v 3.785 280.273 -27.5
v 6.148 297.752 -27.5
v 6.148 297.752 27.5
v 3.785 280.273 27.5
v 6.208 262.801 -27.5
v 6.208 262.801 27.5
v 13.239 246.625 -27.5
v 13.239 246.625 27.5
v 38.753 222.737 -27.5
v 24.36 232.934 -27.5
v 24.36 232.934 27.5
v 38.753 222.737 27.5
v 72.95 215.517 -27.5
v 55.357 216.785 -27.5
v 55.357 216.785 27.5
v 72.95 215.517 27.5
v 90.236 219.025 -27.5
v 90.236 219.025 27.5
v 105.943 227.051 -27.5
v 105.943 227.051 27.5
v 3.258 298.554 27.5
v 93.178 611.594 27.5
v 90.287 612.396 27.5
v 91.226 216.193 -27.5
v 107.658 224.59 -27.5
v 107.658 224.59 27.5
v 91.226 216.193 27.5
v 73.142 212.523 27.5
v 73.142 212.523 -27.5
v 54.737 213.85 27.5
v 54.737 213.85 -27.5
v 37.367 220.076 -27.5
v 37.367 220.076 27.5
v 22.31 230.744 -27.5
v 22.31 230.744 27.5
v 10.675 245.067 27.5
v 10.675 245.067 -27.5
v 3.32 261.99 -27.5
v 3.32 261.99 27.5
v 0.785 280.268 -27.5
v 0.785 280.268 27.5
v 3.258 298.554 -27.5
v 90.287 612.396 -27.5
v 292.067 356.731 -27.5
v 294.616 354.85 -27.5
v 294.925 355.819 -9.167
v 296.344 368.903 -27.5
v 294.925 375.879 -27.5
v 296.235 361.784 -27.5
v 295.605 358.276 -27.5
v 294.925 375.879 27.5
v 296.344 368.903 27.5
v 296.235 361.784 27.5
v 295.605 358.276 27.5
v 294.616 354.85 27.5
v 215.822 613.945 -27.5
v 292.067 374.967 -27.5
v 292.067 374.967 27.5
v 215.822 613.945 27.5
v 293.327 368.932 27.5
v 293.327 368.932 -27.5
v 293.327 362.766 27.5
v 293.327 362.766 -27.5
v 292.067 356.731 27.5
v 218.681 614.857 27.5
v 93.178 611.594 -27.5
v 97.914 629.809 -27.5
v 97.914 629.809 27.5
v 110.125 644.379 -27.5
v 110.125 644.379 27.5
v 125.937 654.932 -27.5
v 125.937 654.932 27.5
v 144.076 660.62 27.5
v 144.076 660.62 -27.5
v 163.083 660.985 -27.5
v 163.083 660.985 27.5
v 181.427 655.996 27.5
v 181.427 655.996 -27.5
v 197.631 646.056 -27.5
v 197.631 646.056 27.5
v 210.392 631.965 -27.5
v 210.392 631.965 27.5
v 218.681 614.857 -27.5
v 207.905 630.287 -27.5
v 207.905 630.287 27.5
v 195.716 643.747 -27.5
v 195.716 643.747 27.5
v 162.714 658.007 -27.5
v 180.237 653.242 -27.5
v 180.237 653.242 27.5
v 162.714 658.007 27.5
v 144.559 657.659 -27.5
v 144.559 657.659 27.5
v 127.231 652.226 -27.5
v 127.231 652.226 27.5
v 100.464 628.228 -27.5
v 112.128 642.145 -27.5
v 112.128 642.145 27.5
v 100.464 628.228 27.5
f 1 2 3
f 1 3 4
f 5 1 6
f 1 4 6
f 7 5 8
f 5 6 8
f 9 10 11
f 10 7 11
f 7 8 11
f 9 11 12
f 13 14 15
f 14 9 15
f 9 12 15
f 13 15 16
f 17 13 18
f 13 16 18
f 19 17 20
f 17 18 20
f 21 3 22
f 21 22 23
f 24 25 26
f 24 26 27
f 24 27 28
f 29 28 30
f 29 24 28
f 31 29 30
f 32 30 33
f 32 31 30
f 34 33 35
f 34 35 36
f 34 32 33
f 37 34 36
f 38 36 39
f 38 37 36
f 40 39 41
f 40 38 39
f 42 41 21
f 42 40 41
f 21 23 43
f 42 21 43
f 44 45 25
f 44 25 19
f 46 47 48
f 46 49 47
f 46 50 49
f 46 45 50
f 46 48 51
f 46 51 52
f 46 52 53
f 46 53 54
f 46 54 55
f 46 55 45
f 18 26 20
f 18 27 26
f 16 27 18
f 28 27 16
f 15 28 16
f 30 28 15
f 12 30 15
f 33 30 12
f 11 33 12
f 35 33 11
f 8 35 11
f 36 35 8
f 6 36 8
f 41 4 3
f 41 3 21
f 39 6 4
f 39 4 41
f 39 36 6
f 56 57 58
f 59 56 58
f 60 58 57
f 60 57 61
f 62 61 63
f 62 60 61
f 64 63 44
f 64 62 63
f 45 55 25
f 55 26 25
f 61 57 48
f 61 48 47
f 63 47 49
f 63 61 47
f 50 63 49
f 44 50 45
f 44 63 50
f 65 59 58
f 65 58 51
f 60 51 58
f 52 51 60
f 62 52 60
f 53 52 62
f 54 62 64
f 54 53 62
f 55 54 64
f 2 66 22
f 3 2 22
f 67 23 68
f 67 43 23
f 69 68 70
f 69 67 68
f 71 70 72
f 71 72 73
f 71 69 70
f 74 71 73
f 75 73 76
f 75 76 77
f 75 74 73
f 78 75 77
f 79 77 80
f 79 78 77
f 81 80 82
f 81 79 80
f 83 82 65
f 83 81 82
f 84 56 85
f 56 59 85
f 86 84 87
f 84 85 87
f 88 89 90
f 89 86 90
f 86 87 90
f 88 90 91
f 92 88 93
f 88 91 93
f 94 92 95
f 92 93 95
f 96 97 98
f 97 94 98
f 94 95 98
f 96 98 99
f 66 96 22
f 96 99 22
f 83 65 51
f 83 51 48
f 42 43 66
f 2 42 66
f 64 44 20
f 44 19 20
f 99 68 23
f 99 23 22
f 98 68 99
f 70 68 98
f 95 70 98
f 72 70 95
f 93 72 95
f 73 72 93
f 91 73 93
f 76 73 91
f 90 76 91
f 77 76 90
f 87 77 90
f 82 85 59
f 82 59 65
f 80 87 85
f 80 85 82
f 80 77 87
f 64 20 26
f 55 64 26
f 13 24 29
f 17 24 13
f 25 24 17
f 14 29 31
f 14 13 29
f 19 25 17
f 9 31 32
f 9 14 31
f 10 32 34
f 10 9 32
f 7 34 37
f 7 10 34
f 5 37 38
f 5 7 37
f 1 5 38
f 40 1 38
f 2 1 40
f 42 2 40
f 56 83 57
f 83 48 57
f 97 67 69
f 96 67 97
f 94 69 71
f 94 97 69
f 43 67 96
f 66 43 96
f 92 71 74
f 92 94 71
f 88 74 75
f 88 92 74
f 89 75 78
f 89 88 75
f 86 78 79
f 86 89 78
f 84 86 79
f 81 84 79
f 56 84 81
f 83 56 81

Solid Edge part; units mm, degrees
sketch "Sketch1" plane through (0, 0, 0) normal (0, 0, 1) x (1, 0, 0)
  arc A0 (93.177716, 611.594363) -> (215.822462, 613.945088) centre (154.85041, 594.492351) cw
  line L0 (292.066721, 374.967452) -> (215.822462, 613.945088)
  arc A1 (292.066721, 356.730512) -> (292.066721, 374.967452) centre (263.486072, 365.848982) ccw
  line L1 (105.942903, 227.051431) -> (292.066721, 356.730512)
  arc A2 (6.148455, 297.752399) -> (105.942903, 227.051431) centre (68.784785, 280.383169) ccw
  line L2 (93.177716, 611.594363) -> (6.148455, 297.752399)
  dimension "D1" = 64
  dimension "D2" = 65
  dimension "D3" = 30
sketch "Sketch2" plane through (93.177716, 611.594363, 0) normal (-0.2672189, -0.9636358, 0) x (-0.9636358, 0.2672189, 0)
  line L0 (0, -27.5) -> (3, -27.5)
  line L1 (3, -27.5) -> (3, 27.5)
  line L2 (3, 27.5) -> (0, 27.5)
  line L3 (0, 27.5) -> (0, -27.5)
  dimension "D1" = 3
  dimension "D2" = 3
sweep "SweptProtrusion1" add profiles "Sketch2" path "Sketch1"
properties material "Aluminum, 6061-T6"
